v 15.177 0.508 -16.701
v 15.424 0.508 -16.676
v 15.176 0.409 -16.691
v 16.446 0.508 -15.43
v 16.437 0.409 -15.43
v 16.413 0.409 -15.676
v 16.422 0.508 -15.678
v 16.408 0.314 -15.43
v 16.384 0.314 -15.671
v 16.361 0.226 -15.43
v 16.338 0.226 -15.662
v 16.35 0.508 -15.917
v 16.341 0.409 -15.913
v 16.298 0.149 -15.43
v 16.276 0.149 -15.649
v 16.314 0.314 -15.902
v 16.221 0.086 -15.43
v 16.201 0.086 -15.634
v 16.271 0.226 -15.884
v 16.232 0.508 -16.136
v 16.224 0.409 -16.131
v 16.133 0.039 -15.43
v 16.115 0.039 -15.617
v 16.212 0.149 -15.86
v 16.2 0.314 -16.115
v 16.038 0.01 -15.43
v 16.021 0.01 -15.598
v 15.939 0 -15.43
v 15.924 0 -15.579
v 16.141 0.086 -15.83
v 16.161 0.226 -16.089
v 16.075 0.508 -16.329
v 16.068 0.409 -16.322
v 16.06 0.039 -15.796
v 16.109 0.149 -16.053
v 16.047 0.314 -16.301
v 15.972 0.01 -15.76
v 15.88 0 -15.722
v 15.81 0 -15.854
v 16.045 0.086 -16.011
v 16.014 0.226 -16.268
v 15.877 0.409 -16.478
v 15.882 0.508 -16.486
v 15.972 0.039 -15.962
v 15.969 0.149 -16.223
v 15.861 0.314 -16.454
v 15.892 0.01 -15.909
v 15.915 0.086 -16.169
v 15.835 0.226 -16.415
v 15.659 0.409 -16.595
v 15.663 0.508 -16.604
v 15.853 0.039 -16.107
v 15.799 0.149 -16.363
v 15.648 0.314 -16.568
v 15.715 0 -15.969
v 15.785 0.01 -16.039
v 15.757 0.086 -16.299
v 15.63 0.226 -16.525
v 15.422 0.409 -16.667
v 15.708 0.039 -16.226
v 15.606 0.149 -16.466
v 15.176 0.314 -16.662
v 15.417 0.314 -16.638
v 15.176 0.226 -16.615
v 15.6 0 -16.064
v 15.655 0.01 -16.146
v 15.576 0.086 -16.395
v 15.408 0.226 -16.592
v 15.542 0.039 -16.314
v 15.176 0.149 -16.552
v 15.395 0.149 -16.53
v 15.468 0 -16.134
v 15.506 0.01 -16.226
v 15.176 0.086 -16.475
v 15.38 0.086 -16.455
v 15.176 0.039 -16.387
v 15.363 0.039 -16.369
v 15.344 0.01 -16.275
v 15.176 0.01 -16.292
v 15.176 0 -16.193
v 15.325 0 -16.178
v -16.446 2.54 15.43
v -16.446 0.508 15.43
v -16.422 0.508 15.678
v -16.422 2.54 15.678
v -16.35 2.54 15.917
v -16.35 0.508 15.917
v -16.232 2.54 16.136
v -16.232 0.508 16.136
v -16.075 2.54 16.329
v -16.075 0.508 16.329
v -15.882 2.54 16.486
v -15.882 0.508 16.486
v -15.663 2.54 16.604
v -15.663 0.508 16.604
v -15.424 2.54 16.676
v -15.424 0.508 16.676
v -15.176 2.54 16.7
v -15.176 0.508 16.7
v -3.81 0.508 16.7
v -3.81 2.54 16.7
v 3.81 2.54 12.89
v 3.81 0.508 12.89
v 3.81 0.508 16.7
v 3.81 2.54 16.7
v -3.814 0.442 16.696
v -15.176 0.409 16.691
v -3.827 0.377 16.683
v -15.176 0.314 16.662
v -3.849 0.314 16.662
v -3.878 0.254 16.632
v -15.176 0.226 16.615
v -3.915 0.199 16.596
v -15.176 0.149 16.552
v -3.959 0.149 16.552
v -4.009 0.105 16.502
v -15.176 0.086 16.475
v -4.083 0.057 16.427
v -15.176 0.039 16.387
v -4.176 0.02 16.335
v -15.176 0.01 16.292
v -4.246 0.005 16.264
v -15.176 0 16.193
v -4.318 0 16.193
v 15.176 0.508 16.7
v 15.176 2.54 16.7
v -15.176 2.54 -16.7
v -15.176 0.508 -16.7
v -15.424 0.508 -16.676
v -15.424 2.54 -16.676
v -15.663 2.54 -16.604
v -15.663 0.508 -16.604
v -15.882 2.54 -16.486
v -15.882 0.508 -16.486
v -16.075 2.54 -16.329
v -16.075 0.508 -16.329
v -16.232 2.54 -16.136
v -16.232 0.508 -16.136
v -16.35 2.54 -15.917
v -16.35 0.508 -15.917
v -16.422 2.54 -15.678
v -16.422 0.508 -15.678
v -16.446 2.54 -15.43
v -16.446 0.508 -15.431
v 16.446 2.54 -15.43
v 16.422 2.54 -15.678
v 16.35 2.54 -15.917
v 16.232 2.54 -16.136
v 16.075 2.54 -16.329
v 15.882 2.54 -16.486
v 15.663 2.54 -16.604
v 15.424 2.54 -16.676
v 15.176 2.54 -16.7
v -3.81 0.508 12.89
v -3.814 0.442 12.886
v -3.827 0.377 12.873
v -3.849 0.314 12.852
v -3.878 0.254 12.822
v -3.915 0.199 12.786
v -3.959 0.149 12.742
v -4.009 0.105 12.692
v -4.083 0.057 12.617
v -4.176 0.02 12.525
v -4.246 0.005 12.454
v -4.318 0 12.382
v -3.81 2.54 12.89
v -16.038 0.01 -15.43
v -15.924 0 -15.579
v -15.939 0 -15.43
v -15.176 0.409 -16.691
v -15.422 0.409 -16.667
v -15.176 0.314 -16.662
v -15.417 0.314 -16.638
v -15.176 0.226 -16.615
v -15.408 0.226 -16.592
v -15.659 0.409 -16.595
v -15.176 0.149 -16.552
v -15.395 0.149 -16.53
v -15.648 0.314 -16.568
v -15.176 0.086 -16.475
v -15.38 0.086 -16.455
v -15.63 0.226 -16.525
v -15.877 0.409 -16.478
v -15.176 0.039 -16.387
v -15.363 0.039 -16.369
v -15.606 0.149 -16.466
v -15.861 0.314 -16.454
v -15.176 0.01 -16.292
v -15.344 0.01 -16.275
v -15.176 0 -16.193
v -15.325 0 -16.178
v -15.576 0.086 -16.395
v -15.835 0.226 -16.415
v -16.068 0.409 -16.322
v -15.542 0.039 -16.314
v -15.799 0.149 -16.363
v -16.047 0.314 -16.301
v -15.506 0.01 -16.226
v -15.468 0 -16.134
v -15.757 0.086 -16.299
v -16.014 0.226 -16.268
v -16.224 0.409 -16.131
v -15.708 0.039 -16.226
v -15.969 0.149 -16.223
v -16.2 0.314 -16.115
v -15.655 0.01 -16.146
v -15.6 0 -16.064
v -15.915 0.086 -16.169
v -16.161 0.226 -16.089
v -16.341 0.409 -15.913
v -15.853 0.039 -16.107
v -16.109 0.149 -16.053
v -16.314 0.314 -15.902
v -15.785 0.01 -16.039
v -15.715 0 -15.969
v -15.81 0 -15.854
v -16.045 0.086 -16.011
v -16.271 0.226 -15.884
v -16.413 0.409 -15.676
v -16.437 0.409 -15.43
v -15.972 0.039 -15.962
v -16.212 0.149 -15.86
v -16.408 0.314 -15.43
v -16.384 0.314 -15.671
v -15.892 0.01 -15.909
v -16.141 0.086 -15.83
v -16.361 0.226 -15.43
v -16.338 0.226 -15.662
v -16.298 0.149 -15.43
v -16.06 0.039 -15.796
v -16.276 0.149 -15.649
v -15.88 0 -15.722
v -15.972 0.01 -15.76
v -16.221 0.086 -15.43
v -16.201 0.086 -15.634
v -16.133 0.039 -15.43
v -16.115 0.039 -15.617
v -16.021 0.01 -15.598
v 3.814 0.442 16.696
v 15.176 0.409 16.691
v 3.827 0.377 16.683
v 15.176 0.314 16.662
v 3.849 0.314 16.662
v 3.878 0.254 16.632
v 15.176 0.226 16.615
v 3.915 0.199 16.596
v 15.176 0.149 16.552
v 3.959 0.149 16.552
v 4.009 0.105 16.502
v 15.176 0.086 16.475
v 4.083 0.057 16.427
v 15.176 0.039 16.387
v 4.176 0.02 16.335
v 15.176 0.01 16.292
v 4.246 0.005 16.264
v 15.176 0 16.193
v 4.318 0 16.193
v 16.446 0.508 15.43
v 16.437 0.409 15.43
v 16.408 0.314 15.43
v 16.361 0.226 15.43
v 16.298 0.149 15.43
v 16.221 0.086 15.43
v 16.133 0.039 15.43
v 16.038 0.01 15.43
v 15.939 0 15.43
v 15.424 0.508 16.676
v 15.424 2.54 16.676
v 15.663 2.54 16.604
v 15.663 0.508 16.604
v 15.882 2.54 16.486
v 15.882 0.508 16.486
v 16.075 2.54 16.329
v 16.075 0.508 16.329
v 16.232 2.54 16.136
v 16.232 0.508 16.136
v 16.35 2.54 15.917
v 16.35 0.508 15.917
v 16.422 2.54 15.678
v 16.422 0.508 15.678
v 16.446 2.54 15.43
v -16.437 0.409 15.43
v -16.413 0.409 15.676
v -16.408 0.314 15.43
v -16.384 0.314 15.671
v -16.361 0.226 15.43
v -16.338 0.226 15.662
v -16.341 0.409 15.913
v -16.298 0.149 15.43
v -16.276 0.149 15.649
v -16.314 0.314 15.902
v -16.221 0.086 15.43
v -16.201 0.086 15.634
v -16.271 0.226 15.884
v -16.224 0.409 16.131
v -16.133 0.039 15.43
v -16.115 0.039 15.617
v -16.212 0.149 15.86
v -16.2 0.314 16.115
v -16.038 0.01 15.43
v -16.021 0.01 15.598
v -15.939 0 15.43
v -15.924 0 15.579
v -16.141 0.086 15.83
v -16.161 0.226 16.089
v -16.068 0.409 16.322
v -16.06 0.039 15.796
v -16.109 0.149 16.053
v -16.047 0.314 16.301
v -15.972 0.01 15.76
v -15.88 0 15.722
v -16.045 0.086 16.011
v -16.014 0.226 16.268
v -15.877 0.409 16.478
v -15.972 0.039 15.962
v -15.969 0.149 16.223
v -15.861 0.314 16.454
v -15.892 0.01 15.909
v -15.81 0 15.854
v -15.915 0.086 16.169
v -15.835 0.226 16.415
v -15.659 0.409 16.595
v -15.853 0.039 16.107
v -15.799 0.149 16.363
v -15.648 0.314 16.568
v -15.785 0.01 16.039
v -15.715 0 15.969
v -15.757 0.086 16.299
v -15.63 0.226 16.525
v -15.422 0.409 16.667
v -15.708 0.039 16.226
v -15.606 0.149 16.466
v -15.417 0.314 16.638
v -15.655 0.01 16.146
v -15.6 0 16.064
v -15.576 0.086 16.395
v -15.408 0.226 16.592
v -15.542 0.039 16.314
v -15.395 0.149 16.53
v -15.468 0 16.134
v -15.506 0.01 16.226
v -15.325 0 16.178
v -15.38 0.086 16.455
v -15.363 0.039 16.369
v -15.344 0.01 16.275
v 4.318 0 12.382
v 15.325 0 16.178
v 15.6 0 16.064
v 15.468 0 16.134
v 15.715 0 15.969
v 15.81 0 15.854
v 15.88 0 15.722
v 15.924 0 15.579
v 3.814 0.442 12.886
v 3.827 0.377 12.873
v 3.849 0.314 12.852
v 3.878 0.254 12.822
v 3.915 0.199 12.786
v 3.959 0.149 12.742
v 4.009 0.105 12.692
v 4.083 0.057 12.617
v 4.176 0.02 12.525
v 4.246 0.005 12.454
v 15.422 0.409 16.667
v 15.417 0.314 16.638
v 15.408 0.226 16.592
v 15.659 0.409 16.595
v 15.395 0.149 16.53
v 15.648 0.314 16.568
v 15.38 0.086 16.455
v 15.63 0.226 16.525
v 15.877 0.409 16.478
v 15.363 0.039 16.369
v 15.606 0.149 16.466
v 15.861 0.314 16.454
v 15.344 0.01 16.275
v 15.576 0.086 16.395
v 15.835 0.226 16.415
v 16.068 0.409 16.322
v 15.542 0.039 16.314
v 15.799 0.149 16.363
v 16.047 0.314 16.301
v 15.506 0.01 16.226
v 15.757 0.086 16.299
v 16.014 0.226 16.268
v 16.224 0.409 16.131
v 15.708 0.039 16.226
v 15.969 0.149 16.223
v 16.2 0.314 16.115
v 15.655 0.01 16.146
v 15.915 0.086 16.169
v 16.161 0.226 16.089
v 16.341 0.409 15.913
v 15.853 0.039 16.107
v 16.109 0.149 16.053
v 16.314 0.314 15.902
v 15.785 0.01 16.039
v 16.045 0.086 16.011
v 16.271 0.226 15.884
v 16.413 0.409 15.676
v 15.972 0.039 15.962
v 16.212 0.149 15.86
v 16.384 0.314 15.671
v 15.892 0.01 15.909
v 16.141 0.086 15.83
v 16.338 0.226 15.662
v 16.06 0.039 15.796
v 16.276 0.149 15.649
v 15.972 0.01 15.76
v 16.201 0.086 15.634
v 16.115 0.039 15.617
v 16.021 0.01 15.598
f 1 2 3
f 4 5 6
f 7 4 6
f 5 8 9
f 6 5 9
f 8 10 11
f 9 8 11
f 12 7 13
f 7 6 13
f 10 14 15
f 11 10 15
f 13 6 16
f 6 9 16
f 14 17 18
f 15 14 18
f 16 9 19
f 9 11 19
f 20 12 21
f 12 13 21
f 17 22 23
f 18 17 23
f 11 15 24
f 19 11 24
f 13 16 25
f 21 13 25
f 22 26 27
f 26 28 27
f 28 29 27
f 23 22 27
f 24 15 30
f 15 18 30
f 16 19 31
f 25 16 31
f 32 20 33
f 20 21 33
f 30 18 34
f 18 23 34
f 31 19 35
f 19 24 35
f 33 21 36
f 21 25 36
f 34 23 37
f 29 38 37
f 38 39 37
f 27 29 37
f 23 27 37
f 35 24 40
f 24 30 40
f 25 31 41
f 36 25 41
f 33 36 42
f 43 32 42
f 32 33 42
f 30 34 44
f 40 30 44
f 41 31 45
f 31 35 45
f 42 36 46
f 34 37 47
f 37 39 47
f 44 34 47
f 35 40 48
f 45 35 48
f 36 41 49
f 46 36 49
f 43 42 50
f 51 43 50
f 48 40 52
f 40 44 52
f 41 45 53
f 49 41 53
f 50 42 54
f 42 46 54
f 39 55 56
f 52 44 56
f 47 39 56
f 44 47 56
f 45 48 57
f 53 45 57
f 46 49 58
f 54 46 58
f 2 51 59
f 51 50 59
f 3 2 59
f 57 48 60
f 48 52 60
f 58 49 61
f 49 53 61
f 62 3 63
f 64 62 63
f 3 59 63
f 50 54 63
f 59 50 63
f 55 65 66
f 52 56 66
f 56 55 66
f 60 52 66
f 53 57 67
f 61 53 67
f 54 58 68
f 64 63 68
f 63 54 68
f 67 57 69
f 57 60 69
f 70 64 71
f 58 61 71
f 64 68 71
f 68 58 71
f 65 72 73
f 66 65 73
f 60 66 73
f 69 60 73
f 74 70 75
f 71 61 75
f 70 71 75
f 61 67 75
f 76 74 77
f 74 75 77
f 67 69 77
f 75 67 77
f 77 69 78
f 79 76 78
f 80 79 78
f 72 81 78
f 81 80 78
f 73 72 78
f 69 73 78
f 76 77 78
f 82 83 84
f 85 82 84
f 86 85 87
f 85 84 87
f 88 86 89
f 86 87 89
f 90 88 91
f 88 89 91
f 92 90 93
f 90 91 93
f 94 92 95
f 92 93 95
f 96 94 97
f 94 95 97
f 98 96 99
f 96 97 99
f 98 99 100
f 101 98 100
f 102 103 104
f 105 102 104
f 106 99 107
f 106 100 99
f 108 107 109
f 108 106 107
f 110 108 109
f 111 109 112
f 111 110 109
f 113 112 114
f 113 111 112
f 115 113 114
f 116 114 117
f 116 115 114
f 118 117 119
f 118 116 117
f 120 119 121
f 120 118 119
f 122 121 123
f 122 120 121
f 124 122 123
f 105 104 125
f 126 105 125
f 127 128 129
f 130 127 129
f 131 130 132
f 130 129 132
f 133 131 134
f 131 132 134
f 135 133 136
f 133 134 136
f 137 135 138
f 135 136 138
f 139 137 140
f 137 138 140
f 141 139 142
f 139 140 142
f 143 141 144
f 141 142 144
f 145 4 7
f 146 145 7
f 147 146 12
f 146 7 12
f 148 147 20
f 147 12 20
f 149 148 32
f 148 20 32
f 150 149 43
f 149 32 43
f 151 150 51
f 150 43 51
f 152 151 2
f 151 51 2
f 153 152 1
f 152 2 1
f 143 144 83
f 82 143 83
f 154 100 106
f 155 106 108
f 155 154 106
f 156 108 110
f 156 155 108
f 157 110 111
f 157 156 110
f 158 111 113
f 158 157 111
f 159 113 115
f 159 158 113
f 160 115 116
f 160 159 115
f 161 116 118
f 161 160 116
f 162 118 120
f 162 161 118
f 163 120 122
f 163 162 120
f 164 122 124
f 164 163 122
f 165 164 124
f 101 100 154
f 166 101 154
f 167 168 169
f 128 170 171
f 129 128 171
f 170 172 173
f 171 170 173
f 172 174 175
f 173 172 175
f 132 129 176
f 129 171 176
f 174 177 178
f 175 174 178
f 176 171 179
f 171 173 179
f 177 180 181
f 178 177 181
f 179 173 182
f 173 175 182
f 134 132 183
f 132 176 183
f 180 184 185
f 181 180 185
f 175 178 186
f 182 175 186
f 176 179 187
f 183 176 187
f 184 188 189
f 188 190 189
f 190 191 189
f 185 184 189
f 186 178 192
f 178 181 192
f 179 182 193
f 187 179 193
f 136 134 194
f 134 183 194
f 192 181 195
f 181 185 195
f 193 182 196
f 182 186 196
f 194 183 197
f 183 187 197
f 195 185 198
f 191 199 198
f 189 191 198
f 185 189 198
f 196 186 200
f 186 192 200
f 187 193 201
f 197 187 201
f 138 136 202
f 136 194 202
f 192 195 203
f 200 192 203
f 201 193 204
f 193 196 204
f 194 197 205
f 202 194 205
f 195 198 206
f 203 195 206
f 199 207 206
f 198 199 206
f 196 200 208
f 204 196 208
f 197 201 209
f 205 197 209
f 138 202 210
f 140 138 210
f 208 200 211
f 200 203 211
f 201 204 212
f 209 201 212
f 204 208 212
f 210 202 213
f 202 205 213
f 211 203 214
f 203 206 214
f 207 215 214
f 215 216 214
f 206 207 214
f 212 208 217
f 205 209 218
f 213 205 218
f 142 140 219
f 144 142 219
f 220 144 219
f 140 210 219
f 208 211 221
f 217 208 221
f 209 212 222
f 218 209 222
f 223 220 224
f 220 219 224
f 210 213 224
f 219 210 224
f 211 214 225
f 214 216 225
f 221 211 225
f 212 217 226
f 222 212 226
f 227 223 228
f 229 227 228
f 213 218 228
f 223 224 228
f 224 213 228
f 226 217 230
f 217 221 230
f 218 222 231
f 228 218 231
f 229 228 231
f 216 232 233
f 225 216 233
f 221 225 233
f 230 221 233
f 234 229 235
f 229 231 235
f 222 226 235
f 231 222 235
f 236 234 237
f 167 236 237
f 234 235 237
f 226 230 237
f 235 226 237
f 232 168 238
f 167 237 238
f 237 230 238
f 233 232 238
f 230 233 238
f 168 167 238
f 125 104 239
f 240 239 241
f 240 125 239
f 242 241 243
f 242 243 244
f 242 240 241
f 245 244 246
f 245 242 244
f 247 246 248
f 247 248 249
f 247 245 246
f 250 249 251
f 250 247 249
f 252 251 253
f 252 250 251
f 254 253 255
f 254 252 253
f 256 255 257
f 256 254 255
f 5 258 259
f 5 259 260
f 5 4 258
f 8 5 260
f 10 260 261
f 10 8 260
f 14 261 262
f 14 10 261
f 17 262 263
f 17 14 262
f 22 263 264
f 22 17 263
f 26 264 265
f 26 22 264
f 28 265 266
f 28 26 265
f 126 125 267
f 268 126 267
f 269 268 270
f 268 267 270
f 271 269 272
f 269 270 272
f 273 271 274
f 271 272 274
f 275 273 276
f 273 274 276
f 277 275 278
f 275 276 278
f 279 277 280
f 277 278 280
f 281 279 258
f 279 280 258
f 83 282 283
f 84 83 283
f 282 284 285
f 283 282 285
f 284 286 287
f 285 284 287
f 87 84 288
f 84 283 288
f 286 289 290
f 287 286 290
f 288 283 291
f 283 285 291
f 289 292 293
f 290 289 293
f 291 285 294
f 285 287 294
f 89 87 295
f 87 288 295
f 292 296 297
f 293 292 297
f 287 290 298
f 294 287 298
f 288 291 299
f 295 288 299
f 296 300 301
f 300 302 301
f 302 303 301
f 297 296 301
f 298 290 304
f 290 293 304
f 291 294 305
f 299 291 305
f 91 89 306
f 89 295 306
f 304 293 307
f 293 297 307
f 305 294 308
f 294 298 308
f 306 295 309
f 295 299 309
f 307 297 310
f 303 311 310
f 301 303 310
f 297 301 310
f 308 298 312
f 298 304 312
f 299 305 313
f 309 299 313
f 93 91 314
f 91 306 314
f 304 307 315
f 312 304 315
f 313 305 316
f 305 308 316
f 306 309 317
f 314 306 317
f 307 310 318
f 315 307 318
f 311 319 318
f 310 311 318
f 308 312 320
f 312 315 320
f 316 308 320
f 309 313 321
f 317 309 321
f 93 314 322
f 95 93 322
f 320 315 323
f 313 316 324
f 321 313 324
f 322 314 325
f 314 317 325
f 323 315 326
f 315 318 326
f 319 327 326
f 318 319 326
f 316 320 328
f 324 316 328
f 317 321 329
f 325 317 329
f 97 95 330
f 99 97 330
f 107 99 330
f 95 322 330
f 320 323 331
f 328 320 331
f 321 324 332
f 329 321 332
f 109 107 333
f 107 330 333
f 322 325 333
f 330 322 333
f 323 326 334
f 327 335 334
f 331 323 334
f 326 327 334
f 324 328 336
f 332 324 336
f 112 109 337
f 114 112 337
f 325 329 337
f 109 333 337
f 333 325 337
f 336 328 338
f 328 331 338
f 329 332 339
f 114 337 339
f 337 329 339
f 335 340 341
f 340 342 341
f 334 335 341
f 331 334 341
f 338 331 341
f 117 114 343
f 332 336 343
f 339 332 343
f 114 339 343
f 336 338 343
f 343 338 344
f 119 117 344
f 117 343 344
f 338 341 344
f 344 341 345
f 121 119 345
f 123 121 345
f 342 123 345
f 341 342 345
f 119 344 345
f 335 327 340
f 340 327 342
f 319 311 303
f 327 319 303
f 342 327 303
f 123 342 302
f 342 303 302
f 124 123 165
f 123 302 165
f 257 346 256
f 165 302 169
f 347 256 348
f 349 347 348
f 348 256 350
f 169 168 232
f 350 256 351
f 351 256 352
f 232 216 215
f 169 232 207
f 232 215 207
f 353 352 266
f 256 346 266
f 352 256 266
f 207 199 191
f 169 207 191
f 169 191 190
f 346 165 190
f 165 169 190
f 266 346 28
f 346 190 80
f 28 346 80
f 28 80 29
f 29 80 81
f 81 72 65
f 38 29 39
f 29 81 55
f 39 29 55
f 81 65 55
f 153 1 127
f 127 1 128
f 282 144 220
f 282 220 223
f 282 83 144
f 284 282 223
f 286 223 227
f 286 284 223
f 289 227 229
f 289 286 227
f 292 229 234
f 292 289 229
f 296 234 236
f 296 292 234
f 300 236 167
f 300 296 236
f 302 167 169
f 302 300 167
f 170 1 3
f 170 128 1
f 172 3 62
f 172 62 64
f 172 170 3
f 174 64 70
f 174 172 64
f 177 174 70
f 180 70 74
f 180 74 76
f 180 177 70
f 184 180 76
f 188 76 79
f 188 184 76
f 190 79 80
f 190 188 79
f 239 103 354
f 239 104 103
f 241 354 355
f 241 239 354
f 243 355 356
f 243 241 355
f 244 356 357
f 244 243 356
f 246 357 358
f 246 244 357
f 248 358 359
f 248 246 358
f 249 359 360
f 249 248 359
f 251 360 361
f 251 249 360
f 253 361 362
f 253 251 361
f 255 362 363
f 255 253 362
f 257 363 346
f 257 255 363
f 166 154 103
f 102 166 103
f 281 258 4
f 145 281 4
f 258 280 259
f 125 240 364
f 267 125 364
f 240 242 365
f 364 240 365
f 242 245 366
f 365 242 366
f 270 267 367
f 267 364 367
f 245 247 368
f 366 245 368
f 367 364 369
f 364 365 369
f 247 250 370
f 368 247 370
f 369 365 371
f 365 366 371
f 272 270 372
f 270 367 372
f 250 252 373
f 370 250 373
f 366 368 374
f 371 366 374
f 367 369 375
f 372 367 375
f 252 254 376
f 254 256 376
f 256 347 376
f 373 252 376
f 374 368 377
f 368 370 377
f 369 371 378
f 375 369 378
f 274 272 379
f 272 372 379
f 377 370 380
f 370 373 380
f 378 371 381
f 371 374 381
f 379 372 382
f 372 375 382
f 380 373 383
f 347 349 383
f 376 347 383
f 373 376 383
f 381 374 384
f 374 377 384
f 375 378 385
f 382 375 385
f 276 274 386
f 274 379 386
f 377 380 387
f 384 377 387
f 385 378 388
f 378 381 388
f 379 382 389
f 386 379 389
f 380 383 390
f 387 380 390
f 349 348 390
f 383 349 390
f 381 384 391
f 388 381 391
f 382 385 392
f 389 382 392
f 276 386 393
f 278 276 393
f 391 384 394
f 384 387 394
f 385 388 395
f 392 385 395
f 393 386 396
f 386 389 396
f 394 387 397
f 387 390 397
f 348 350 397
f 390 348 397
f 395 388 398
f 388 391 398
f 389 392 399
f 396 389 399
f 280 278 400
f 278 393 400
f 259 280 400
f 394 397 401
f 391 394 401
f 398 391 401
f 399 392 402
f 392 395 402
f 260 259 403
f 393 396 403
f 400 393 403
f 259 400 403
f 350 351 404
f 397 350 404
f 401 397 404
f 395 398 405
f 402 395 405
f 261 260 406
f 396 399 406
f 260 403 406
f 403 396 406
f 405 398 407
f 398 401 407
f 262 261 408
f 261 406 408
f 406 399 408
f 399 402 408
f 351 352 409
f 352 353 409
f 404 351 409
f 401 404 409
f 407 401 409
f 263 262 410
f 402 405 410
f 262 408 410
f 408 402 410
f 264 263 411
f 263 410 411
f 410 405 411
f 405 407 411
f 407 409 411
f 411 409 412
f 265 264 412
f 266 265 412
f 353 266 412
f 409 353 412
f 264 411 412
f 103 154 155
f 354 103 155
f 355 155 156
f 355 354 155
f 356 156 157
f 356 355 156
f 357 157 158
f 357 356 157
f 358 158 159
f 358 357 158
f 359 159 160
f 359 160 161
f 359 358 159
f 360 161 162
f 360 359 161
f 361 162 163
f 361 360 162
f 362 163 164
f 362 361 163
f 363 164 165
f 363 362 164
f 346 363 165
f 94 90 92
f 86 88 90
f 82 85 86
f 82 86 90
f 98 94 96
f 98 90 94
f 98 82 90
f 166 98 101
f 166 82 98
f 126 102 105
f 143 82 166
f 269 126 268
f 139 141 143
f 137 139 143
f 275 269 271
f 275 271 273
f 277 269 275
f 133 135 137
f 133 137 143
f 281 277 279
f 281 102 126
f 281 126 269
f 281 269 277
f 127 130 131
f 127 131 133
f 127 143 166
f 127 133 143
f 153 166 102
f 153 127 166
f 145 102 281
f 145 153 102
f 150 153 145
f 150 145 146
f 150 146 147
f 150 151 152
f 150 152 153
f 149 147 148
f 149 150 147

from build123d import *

# Parameters (mm, degrees)
BOSS_EXTRUDE1_DEPTH = 2.54
FILLET1_R           = 0.508


with BuildPart() as part:
    # Sketch1 → Boss-Extrude1 (new body)
    with BuildSketch(Plane(origin=(0, 0, 0), x_dir=(1, 0, 0), z_dir=(0, 1, 0))):
        with BuildLine():
            Line((-3.81, -16.7005), (-3.81, -12.8905))
            Line((-3.81, -12.8905), (3.81, -12.8905))
            Line((3.81, -12.8905), (3.81, -16.7005))
            Line((3.81, -16.7005), (15.1765, -16.7005))
            ThreePointArc((15.1765, -16.7005), (16.074525612, -16.328525612), (16.4465, -15.4305))
            Line((16.4465, -15.4305), (16.4465, 15.4305))
            ThreePointArc((16.4465, 15.4305), (16.074525612, 16.328525612), (15.1765, 16.7005))
            Line((15.1765, 16.7005), (-15.1765, 16.7005))
            ThreePointArc((-15.1765, 16.7005), (-16.074525612, 16.328525612), (-16.4465, 15.4305))
            Line((-16.4465, 15.4305), (-16.4465, -15.4305))
            ThreePointArc((-16.4465, -15.4305), (-16.074525612, -16.328525612), (-15.1765, -16.7005))
            Line((-15.1765, -16.7005), (-3.81, -16.7005))
        make_face()
    extrude(amount=BOSS_EXTRUDE1_DEPTH)

    # Fillet1
    fillet1_edges = [part.edges().sort_by_distance(p)[0] for p in [
        (-16.4465, 0, 0),
        (-16.074525612, 0, -16.328525612),
        (0, 0, -16.7005),
        (16.074525612, 0, -16.328525612),
        (16.4465, 0, 0),
        (16.074525612, 0, 16.328525612),
        (9.49325, 0, 16.7005),
        (3.81, 0, 14.7955),
        (0, 0, 12.8905),
        (-3.81, 0, 14.7955),
        (-9.49325, 0, 16.7005),
        (-16.074525612, 0, 16.328525612),
    ]]
    fillet(fillet1_edges, radius=FILLET1_R)


solid = part.part
